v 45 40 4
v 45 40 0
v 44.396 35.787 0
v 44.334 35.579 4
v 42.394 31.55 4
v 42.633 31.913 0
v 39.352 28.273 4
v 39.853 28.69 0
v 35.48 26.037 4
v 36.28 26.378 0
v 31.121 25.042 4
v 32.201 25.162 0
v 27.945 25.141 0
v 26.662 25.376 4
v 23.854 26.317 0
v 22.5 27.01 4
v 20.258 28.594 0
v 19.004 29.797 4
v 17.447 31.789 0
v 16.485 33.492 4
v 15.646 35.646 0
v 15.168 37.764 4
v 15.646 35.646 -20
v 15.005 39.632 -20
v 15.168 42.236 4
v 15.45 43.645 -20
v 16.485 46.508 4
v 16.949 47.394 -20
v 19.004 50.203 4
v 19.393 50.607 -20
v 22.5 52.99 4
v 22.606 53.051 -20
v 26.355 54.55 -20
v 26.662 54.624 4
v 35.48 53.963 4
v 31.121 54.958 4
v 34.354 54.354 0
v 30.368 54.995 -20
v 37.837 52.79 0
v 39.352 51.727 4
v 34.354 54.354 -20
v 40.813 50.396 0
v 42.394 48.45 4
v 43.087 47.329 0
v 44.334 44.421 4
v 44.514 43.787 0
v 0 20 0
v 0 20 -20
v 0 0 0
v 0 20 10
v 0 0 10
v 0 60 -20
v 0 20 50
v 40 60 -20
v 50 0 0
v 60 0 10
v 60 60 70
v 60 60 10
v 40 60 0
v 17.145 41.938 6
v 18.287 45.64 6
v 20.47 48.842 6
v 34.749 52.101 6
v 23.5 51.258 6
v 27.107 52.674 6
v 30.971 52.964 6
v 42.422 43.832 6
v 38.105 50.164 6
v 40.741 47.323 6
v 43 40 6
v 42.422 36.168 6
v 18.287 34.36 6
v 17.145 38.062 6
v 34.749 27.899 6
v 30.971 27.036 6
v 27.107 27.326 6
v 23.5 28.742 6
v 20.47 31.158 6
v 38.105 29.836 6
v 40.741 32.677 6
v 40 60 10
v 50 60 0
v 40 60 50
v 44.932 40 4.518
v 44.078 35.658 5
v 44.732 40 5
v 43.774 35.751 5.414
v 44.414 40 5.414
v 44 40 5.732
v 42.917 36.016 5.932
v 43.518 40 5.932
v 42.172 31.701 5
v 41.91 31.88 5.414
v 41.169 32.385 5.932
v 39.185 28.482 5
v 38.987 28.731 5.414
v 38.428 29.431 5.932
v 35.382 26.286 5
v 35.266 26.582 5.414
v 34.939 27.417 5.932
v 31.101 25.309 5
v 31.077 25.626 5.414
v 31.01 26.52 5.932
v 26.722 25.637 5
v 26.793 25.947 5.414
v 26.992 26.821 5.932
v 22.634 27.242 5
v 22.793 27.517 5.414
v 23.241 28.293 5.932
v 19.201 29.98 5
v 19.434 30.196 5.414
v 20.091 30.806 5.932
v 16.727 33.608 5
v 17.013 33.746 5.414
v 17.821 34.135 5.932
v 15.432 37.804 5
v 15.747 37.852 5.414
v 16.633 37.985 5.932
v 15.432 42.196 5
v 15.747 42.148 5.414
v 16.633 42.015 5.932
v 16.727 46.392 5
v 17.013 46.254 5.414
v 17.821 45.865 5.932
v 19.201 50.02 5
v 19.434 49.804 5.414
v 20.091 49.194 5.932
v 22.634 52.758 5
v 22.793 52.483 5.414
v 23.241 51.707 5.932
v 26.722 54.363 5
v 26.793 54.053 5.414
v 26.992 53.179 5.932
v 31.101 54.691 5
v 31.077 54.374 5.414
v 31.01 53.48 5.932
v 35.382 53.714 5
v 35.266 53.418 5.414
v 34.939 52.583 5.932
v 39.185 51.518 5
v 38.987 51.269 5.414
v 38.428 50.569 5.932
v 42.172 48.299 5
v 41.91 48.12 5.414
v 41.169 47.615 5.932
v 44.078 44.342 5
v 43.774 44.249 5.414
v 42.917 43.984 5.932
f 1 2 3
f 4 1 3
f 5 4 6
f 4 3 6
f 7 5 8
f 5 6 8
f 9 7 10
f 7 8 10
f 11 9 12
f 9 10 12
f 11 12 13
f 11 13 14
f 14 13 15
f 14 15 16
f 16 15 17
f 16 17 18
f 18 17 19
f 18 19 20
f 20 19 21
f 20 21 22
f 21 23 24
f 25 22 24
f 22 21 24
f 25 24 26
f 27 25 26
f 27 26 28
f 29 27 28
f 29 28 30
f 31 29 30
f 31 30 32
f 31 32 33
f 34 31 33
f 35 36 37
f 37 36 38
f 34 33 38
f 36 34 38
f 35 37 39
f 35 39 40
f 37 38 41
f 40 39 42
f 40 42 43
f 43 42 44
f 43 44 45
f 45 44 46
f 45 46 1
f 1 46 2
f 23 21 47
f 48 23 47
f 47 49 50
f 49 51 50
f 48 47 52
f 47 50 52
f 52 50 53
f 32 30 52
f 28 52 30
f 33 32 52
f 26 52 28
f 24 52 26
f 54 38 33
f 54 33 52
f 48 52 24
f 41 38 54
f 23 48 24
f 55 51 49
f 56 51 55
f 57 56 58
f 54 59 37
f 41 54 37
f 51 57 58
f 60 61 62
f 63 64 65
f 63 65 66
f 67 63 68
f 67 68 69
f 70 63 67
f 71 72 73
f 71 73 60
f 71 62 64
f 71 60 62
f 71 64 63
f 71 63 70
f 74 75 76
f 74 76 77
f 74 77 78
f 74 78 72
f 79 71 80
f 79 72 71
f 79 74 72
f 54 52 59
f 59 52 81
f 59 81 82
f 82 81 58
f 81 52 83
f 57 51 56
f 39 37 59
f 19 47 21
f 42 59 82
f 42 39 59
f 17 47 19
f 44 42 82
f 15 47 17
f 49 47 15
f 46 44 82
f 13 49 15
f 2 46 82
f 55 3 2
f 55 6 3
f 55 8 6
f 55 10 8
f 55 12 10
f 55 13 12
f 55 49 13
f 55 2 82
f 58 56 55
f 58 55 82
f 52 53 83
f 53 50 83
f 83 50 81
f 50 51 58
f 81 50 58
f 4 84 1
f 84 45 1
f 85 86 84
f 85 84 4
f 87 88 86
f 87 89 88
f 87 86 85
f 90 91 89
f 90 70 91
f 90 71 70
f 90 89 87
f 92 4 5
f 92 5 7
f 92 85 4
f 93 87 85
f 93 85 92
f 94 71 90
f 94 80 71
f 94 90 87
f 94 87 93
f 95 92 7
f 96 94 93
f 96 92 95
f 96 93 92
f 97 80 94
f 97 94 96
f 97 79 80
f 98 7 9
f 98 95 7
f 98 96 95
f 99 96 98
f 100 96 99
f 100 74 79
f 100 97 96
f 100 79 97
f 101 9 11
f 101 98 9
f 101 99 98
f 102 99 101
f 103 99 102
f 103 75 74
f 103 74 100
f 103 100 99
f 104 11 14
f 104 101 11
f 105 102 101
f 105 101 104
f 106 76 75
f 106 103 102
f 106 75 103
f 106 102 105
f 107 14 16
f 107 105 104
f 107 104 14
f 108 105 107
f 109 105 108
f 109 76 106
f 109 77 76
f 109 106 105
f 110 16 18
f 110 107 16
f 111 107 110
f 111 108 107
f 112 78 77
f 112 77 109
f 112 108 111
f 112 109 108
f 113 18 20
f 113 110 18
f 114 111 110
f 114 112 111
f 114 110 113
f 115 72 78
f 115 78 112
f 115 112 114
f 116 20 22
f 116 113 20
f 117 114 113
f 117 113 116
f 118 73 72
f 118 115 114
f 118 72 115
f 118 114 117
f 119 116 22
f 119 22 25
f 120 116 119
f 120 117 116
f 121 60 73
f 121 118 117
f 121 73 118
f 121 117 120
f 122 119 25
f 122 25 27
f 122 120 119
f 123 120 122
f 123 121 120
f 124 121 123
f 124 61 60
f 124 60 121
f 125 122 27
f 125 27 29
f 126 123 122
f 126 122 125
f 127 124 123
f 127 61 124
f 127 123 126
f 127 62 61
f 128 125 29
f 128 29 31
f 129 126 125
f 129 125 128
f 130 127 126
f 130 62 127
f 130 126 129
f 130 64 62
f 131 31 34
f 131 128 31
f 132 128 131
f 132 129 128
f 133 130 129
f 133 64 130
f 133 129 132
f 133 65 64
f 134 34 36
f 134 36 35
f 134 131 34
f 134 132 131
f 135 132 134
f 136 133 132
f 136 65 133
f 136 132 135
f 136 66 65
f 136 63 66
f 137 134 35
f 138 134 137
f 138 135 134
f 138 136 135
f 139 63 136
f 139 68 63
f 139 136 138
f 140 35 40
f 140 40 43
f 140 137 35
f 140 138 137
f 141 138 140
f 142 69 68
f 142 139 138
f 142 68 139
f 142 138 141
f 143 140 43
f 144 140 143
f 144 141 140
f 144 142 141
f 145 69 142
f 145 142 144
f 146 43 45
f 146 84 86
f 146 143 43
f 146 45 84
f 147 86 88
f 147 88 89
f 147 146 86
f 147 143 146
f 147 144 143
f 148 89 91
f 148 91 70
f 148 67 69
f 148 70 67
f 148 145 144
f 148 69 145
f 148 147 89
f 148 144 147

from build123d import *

# Parameters (mm, degrees)
F0_W      = 60
F0_H      = 10
F1_DEPTH  = 60
F2_SIZE   = 9.99999
F9_DEPTH  = 40
F11_DEPTH = 20
F13_R     = 15
F14_DEPTH = 26
F15_R     = 2


# Not quite as in the source:
# - a fillet or chamfer is up to 0.001 mm smaller than in the source, because OpenCascade refuses the exact size


with BuildPart() as f1:
    # F0 (on Front) → F1 (new body)
    with BuildSketch(Plane.XZ):
        with Locations((30, 5)):
            Rectangle(F0_W, F0_H)
    extrude(amount=-F1_DEPTH)

    # F2 (size 10 in the source; OpenCascade refuses exactly that, so slightly less here)
    f2_edges = [f1.edges().sort_by_distance(p)[0] for p in [
        (60, 30, 0),
    ]]
    chamfer(f2_edges, length=F2_SIZE)

    # F5 (on face) → F6 section 0
    with BuildSketch(Plane.XY.offset(10), mode=Mode.PRIVATE) as f6_s0:
        Polygon((60, 0), (60, 60), (0, 0), align=None)
    loft([f6_s0.sketch, Vertex(60, 60, 70)])

    # F8 (on face) → F9 (join)
    with BuildSketch(Plane.XY.offset(10)):
        Polygon((40, 60), (0, 60), (0, 20), align=None)
    extrude(amount=F9_DEPTH)

    # F10 (on face) → F11 (join)
    with BuildSketch(Plane(origin=(0, 0, 0), x_dir=(1, 0, 0), z_dir=(0, 0, -1))):
        Polygon((0, -20), (0, -60), (40, -60), align=None)
    extrude(amount=F11_DEPTH)

    # F9_face (on face) → F12 section 0
    with BuildSketch(Plane(origin=(13.3333333333, 46.6666666667, 50), x_dir=(1, 0, 0), z_dir=(0, 0, 1)), mode=Mode.PRIVATE) as f12_s0:
        Polygon((26.6666666667, 13.3333333333), (-13.3333333333, 13.3333333333), (-13.3333333333, -26.6666666667), align=None)
    loft([f12_s0.sketch, Vertex(0, 60, -20)], mode=Mode.SUBTRACT)

    # F13 (on face) → F14 (cut)
    with BuildSketch(Plane(origin=(0, 0, -20), x_dir=(1, 0, 0), z_dir=(0, 0, -1))):
        with Locations((30, -40)):
            Circle(F13_R)
    extrude(amount=-F14_DEPTH, mode=Mode.SUBTRACT)

    # F15
    f15_edges = [f1.edges().sort_by_distance(p)[0] for p in [
        (15, 40, 6),
    ]]
    fillet(f15_edges, radius=F15_R)


solid = f1.part
